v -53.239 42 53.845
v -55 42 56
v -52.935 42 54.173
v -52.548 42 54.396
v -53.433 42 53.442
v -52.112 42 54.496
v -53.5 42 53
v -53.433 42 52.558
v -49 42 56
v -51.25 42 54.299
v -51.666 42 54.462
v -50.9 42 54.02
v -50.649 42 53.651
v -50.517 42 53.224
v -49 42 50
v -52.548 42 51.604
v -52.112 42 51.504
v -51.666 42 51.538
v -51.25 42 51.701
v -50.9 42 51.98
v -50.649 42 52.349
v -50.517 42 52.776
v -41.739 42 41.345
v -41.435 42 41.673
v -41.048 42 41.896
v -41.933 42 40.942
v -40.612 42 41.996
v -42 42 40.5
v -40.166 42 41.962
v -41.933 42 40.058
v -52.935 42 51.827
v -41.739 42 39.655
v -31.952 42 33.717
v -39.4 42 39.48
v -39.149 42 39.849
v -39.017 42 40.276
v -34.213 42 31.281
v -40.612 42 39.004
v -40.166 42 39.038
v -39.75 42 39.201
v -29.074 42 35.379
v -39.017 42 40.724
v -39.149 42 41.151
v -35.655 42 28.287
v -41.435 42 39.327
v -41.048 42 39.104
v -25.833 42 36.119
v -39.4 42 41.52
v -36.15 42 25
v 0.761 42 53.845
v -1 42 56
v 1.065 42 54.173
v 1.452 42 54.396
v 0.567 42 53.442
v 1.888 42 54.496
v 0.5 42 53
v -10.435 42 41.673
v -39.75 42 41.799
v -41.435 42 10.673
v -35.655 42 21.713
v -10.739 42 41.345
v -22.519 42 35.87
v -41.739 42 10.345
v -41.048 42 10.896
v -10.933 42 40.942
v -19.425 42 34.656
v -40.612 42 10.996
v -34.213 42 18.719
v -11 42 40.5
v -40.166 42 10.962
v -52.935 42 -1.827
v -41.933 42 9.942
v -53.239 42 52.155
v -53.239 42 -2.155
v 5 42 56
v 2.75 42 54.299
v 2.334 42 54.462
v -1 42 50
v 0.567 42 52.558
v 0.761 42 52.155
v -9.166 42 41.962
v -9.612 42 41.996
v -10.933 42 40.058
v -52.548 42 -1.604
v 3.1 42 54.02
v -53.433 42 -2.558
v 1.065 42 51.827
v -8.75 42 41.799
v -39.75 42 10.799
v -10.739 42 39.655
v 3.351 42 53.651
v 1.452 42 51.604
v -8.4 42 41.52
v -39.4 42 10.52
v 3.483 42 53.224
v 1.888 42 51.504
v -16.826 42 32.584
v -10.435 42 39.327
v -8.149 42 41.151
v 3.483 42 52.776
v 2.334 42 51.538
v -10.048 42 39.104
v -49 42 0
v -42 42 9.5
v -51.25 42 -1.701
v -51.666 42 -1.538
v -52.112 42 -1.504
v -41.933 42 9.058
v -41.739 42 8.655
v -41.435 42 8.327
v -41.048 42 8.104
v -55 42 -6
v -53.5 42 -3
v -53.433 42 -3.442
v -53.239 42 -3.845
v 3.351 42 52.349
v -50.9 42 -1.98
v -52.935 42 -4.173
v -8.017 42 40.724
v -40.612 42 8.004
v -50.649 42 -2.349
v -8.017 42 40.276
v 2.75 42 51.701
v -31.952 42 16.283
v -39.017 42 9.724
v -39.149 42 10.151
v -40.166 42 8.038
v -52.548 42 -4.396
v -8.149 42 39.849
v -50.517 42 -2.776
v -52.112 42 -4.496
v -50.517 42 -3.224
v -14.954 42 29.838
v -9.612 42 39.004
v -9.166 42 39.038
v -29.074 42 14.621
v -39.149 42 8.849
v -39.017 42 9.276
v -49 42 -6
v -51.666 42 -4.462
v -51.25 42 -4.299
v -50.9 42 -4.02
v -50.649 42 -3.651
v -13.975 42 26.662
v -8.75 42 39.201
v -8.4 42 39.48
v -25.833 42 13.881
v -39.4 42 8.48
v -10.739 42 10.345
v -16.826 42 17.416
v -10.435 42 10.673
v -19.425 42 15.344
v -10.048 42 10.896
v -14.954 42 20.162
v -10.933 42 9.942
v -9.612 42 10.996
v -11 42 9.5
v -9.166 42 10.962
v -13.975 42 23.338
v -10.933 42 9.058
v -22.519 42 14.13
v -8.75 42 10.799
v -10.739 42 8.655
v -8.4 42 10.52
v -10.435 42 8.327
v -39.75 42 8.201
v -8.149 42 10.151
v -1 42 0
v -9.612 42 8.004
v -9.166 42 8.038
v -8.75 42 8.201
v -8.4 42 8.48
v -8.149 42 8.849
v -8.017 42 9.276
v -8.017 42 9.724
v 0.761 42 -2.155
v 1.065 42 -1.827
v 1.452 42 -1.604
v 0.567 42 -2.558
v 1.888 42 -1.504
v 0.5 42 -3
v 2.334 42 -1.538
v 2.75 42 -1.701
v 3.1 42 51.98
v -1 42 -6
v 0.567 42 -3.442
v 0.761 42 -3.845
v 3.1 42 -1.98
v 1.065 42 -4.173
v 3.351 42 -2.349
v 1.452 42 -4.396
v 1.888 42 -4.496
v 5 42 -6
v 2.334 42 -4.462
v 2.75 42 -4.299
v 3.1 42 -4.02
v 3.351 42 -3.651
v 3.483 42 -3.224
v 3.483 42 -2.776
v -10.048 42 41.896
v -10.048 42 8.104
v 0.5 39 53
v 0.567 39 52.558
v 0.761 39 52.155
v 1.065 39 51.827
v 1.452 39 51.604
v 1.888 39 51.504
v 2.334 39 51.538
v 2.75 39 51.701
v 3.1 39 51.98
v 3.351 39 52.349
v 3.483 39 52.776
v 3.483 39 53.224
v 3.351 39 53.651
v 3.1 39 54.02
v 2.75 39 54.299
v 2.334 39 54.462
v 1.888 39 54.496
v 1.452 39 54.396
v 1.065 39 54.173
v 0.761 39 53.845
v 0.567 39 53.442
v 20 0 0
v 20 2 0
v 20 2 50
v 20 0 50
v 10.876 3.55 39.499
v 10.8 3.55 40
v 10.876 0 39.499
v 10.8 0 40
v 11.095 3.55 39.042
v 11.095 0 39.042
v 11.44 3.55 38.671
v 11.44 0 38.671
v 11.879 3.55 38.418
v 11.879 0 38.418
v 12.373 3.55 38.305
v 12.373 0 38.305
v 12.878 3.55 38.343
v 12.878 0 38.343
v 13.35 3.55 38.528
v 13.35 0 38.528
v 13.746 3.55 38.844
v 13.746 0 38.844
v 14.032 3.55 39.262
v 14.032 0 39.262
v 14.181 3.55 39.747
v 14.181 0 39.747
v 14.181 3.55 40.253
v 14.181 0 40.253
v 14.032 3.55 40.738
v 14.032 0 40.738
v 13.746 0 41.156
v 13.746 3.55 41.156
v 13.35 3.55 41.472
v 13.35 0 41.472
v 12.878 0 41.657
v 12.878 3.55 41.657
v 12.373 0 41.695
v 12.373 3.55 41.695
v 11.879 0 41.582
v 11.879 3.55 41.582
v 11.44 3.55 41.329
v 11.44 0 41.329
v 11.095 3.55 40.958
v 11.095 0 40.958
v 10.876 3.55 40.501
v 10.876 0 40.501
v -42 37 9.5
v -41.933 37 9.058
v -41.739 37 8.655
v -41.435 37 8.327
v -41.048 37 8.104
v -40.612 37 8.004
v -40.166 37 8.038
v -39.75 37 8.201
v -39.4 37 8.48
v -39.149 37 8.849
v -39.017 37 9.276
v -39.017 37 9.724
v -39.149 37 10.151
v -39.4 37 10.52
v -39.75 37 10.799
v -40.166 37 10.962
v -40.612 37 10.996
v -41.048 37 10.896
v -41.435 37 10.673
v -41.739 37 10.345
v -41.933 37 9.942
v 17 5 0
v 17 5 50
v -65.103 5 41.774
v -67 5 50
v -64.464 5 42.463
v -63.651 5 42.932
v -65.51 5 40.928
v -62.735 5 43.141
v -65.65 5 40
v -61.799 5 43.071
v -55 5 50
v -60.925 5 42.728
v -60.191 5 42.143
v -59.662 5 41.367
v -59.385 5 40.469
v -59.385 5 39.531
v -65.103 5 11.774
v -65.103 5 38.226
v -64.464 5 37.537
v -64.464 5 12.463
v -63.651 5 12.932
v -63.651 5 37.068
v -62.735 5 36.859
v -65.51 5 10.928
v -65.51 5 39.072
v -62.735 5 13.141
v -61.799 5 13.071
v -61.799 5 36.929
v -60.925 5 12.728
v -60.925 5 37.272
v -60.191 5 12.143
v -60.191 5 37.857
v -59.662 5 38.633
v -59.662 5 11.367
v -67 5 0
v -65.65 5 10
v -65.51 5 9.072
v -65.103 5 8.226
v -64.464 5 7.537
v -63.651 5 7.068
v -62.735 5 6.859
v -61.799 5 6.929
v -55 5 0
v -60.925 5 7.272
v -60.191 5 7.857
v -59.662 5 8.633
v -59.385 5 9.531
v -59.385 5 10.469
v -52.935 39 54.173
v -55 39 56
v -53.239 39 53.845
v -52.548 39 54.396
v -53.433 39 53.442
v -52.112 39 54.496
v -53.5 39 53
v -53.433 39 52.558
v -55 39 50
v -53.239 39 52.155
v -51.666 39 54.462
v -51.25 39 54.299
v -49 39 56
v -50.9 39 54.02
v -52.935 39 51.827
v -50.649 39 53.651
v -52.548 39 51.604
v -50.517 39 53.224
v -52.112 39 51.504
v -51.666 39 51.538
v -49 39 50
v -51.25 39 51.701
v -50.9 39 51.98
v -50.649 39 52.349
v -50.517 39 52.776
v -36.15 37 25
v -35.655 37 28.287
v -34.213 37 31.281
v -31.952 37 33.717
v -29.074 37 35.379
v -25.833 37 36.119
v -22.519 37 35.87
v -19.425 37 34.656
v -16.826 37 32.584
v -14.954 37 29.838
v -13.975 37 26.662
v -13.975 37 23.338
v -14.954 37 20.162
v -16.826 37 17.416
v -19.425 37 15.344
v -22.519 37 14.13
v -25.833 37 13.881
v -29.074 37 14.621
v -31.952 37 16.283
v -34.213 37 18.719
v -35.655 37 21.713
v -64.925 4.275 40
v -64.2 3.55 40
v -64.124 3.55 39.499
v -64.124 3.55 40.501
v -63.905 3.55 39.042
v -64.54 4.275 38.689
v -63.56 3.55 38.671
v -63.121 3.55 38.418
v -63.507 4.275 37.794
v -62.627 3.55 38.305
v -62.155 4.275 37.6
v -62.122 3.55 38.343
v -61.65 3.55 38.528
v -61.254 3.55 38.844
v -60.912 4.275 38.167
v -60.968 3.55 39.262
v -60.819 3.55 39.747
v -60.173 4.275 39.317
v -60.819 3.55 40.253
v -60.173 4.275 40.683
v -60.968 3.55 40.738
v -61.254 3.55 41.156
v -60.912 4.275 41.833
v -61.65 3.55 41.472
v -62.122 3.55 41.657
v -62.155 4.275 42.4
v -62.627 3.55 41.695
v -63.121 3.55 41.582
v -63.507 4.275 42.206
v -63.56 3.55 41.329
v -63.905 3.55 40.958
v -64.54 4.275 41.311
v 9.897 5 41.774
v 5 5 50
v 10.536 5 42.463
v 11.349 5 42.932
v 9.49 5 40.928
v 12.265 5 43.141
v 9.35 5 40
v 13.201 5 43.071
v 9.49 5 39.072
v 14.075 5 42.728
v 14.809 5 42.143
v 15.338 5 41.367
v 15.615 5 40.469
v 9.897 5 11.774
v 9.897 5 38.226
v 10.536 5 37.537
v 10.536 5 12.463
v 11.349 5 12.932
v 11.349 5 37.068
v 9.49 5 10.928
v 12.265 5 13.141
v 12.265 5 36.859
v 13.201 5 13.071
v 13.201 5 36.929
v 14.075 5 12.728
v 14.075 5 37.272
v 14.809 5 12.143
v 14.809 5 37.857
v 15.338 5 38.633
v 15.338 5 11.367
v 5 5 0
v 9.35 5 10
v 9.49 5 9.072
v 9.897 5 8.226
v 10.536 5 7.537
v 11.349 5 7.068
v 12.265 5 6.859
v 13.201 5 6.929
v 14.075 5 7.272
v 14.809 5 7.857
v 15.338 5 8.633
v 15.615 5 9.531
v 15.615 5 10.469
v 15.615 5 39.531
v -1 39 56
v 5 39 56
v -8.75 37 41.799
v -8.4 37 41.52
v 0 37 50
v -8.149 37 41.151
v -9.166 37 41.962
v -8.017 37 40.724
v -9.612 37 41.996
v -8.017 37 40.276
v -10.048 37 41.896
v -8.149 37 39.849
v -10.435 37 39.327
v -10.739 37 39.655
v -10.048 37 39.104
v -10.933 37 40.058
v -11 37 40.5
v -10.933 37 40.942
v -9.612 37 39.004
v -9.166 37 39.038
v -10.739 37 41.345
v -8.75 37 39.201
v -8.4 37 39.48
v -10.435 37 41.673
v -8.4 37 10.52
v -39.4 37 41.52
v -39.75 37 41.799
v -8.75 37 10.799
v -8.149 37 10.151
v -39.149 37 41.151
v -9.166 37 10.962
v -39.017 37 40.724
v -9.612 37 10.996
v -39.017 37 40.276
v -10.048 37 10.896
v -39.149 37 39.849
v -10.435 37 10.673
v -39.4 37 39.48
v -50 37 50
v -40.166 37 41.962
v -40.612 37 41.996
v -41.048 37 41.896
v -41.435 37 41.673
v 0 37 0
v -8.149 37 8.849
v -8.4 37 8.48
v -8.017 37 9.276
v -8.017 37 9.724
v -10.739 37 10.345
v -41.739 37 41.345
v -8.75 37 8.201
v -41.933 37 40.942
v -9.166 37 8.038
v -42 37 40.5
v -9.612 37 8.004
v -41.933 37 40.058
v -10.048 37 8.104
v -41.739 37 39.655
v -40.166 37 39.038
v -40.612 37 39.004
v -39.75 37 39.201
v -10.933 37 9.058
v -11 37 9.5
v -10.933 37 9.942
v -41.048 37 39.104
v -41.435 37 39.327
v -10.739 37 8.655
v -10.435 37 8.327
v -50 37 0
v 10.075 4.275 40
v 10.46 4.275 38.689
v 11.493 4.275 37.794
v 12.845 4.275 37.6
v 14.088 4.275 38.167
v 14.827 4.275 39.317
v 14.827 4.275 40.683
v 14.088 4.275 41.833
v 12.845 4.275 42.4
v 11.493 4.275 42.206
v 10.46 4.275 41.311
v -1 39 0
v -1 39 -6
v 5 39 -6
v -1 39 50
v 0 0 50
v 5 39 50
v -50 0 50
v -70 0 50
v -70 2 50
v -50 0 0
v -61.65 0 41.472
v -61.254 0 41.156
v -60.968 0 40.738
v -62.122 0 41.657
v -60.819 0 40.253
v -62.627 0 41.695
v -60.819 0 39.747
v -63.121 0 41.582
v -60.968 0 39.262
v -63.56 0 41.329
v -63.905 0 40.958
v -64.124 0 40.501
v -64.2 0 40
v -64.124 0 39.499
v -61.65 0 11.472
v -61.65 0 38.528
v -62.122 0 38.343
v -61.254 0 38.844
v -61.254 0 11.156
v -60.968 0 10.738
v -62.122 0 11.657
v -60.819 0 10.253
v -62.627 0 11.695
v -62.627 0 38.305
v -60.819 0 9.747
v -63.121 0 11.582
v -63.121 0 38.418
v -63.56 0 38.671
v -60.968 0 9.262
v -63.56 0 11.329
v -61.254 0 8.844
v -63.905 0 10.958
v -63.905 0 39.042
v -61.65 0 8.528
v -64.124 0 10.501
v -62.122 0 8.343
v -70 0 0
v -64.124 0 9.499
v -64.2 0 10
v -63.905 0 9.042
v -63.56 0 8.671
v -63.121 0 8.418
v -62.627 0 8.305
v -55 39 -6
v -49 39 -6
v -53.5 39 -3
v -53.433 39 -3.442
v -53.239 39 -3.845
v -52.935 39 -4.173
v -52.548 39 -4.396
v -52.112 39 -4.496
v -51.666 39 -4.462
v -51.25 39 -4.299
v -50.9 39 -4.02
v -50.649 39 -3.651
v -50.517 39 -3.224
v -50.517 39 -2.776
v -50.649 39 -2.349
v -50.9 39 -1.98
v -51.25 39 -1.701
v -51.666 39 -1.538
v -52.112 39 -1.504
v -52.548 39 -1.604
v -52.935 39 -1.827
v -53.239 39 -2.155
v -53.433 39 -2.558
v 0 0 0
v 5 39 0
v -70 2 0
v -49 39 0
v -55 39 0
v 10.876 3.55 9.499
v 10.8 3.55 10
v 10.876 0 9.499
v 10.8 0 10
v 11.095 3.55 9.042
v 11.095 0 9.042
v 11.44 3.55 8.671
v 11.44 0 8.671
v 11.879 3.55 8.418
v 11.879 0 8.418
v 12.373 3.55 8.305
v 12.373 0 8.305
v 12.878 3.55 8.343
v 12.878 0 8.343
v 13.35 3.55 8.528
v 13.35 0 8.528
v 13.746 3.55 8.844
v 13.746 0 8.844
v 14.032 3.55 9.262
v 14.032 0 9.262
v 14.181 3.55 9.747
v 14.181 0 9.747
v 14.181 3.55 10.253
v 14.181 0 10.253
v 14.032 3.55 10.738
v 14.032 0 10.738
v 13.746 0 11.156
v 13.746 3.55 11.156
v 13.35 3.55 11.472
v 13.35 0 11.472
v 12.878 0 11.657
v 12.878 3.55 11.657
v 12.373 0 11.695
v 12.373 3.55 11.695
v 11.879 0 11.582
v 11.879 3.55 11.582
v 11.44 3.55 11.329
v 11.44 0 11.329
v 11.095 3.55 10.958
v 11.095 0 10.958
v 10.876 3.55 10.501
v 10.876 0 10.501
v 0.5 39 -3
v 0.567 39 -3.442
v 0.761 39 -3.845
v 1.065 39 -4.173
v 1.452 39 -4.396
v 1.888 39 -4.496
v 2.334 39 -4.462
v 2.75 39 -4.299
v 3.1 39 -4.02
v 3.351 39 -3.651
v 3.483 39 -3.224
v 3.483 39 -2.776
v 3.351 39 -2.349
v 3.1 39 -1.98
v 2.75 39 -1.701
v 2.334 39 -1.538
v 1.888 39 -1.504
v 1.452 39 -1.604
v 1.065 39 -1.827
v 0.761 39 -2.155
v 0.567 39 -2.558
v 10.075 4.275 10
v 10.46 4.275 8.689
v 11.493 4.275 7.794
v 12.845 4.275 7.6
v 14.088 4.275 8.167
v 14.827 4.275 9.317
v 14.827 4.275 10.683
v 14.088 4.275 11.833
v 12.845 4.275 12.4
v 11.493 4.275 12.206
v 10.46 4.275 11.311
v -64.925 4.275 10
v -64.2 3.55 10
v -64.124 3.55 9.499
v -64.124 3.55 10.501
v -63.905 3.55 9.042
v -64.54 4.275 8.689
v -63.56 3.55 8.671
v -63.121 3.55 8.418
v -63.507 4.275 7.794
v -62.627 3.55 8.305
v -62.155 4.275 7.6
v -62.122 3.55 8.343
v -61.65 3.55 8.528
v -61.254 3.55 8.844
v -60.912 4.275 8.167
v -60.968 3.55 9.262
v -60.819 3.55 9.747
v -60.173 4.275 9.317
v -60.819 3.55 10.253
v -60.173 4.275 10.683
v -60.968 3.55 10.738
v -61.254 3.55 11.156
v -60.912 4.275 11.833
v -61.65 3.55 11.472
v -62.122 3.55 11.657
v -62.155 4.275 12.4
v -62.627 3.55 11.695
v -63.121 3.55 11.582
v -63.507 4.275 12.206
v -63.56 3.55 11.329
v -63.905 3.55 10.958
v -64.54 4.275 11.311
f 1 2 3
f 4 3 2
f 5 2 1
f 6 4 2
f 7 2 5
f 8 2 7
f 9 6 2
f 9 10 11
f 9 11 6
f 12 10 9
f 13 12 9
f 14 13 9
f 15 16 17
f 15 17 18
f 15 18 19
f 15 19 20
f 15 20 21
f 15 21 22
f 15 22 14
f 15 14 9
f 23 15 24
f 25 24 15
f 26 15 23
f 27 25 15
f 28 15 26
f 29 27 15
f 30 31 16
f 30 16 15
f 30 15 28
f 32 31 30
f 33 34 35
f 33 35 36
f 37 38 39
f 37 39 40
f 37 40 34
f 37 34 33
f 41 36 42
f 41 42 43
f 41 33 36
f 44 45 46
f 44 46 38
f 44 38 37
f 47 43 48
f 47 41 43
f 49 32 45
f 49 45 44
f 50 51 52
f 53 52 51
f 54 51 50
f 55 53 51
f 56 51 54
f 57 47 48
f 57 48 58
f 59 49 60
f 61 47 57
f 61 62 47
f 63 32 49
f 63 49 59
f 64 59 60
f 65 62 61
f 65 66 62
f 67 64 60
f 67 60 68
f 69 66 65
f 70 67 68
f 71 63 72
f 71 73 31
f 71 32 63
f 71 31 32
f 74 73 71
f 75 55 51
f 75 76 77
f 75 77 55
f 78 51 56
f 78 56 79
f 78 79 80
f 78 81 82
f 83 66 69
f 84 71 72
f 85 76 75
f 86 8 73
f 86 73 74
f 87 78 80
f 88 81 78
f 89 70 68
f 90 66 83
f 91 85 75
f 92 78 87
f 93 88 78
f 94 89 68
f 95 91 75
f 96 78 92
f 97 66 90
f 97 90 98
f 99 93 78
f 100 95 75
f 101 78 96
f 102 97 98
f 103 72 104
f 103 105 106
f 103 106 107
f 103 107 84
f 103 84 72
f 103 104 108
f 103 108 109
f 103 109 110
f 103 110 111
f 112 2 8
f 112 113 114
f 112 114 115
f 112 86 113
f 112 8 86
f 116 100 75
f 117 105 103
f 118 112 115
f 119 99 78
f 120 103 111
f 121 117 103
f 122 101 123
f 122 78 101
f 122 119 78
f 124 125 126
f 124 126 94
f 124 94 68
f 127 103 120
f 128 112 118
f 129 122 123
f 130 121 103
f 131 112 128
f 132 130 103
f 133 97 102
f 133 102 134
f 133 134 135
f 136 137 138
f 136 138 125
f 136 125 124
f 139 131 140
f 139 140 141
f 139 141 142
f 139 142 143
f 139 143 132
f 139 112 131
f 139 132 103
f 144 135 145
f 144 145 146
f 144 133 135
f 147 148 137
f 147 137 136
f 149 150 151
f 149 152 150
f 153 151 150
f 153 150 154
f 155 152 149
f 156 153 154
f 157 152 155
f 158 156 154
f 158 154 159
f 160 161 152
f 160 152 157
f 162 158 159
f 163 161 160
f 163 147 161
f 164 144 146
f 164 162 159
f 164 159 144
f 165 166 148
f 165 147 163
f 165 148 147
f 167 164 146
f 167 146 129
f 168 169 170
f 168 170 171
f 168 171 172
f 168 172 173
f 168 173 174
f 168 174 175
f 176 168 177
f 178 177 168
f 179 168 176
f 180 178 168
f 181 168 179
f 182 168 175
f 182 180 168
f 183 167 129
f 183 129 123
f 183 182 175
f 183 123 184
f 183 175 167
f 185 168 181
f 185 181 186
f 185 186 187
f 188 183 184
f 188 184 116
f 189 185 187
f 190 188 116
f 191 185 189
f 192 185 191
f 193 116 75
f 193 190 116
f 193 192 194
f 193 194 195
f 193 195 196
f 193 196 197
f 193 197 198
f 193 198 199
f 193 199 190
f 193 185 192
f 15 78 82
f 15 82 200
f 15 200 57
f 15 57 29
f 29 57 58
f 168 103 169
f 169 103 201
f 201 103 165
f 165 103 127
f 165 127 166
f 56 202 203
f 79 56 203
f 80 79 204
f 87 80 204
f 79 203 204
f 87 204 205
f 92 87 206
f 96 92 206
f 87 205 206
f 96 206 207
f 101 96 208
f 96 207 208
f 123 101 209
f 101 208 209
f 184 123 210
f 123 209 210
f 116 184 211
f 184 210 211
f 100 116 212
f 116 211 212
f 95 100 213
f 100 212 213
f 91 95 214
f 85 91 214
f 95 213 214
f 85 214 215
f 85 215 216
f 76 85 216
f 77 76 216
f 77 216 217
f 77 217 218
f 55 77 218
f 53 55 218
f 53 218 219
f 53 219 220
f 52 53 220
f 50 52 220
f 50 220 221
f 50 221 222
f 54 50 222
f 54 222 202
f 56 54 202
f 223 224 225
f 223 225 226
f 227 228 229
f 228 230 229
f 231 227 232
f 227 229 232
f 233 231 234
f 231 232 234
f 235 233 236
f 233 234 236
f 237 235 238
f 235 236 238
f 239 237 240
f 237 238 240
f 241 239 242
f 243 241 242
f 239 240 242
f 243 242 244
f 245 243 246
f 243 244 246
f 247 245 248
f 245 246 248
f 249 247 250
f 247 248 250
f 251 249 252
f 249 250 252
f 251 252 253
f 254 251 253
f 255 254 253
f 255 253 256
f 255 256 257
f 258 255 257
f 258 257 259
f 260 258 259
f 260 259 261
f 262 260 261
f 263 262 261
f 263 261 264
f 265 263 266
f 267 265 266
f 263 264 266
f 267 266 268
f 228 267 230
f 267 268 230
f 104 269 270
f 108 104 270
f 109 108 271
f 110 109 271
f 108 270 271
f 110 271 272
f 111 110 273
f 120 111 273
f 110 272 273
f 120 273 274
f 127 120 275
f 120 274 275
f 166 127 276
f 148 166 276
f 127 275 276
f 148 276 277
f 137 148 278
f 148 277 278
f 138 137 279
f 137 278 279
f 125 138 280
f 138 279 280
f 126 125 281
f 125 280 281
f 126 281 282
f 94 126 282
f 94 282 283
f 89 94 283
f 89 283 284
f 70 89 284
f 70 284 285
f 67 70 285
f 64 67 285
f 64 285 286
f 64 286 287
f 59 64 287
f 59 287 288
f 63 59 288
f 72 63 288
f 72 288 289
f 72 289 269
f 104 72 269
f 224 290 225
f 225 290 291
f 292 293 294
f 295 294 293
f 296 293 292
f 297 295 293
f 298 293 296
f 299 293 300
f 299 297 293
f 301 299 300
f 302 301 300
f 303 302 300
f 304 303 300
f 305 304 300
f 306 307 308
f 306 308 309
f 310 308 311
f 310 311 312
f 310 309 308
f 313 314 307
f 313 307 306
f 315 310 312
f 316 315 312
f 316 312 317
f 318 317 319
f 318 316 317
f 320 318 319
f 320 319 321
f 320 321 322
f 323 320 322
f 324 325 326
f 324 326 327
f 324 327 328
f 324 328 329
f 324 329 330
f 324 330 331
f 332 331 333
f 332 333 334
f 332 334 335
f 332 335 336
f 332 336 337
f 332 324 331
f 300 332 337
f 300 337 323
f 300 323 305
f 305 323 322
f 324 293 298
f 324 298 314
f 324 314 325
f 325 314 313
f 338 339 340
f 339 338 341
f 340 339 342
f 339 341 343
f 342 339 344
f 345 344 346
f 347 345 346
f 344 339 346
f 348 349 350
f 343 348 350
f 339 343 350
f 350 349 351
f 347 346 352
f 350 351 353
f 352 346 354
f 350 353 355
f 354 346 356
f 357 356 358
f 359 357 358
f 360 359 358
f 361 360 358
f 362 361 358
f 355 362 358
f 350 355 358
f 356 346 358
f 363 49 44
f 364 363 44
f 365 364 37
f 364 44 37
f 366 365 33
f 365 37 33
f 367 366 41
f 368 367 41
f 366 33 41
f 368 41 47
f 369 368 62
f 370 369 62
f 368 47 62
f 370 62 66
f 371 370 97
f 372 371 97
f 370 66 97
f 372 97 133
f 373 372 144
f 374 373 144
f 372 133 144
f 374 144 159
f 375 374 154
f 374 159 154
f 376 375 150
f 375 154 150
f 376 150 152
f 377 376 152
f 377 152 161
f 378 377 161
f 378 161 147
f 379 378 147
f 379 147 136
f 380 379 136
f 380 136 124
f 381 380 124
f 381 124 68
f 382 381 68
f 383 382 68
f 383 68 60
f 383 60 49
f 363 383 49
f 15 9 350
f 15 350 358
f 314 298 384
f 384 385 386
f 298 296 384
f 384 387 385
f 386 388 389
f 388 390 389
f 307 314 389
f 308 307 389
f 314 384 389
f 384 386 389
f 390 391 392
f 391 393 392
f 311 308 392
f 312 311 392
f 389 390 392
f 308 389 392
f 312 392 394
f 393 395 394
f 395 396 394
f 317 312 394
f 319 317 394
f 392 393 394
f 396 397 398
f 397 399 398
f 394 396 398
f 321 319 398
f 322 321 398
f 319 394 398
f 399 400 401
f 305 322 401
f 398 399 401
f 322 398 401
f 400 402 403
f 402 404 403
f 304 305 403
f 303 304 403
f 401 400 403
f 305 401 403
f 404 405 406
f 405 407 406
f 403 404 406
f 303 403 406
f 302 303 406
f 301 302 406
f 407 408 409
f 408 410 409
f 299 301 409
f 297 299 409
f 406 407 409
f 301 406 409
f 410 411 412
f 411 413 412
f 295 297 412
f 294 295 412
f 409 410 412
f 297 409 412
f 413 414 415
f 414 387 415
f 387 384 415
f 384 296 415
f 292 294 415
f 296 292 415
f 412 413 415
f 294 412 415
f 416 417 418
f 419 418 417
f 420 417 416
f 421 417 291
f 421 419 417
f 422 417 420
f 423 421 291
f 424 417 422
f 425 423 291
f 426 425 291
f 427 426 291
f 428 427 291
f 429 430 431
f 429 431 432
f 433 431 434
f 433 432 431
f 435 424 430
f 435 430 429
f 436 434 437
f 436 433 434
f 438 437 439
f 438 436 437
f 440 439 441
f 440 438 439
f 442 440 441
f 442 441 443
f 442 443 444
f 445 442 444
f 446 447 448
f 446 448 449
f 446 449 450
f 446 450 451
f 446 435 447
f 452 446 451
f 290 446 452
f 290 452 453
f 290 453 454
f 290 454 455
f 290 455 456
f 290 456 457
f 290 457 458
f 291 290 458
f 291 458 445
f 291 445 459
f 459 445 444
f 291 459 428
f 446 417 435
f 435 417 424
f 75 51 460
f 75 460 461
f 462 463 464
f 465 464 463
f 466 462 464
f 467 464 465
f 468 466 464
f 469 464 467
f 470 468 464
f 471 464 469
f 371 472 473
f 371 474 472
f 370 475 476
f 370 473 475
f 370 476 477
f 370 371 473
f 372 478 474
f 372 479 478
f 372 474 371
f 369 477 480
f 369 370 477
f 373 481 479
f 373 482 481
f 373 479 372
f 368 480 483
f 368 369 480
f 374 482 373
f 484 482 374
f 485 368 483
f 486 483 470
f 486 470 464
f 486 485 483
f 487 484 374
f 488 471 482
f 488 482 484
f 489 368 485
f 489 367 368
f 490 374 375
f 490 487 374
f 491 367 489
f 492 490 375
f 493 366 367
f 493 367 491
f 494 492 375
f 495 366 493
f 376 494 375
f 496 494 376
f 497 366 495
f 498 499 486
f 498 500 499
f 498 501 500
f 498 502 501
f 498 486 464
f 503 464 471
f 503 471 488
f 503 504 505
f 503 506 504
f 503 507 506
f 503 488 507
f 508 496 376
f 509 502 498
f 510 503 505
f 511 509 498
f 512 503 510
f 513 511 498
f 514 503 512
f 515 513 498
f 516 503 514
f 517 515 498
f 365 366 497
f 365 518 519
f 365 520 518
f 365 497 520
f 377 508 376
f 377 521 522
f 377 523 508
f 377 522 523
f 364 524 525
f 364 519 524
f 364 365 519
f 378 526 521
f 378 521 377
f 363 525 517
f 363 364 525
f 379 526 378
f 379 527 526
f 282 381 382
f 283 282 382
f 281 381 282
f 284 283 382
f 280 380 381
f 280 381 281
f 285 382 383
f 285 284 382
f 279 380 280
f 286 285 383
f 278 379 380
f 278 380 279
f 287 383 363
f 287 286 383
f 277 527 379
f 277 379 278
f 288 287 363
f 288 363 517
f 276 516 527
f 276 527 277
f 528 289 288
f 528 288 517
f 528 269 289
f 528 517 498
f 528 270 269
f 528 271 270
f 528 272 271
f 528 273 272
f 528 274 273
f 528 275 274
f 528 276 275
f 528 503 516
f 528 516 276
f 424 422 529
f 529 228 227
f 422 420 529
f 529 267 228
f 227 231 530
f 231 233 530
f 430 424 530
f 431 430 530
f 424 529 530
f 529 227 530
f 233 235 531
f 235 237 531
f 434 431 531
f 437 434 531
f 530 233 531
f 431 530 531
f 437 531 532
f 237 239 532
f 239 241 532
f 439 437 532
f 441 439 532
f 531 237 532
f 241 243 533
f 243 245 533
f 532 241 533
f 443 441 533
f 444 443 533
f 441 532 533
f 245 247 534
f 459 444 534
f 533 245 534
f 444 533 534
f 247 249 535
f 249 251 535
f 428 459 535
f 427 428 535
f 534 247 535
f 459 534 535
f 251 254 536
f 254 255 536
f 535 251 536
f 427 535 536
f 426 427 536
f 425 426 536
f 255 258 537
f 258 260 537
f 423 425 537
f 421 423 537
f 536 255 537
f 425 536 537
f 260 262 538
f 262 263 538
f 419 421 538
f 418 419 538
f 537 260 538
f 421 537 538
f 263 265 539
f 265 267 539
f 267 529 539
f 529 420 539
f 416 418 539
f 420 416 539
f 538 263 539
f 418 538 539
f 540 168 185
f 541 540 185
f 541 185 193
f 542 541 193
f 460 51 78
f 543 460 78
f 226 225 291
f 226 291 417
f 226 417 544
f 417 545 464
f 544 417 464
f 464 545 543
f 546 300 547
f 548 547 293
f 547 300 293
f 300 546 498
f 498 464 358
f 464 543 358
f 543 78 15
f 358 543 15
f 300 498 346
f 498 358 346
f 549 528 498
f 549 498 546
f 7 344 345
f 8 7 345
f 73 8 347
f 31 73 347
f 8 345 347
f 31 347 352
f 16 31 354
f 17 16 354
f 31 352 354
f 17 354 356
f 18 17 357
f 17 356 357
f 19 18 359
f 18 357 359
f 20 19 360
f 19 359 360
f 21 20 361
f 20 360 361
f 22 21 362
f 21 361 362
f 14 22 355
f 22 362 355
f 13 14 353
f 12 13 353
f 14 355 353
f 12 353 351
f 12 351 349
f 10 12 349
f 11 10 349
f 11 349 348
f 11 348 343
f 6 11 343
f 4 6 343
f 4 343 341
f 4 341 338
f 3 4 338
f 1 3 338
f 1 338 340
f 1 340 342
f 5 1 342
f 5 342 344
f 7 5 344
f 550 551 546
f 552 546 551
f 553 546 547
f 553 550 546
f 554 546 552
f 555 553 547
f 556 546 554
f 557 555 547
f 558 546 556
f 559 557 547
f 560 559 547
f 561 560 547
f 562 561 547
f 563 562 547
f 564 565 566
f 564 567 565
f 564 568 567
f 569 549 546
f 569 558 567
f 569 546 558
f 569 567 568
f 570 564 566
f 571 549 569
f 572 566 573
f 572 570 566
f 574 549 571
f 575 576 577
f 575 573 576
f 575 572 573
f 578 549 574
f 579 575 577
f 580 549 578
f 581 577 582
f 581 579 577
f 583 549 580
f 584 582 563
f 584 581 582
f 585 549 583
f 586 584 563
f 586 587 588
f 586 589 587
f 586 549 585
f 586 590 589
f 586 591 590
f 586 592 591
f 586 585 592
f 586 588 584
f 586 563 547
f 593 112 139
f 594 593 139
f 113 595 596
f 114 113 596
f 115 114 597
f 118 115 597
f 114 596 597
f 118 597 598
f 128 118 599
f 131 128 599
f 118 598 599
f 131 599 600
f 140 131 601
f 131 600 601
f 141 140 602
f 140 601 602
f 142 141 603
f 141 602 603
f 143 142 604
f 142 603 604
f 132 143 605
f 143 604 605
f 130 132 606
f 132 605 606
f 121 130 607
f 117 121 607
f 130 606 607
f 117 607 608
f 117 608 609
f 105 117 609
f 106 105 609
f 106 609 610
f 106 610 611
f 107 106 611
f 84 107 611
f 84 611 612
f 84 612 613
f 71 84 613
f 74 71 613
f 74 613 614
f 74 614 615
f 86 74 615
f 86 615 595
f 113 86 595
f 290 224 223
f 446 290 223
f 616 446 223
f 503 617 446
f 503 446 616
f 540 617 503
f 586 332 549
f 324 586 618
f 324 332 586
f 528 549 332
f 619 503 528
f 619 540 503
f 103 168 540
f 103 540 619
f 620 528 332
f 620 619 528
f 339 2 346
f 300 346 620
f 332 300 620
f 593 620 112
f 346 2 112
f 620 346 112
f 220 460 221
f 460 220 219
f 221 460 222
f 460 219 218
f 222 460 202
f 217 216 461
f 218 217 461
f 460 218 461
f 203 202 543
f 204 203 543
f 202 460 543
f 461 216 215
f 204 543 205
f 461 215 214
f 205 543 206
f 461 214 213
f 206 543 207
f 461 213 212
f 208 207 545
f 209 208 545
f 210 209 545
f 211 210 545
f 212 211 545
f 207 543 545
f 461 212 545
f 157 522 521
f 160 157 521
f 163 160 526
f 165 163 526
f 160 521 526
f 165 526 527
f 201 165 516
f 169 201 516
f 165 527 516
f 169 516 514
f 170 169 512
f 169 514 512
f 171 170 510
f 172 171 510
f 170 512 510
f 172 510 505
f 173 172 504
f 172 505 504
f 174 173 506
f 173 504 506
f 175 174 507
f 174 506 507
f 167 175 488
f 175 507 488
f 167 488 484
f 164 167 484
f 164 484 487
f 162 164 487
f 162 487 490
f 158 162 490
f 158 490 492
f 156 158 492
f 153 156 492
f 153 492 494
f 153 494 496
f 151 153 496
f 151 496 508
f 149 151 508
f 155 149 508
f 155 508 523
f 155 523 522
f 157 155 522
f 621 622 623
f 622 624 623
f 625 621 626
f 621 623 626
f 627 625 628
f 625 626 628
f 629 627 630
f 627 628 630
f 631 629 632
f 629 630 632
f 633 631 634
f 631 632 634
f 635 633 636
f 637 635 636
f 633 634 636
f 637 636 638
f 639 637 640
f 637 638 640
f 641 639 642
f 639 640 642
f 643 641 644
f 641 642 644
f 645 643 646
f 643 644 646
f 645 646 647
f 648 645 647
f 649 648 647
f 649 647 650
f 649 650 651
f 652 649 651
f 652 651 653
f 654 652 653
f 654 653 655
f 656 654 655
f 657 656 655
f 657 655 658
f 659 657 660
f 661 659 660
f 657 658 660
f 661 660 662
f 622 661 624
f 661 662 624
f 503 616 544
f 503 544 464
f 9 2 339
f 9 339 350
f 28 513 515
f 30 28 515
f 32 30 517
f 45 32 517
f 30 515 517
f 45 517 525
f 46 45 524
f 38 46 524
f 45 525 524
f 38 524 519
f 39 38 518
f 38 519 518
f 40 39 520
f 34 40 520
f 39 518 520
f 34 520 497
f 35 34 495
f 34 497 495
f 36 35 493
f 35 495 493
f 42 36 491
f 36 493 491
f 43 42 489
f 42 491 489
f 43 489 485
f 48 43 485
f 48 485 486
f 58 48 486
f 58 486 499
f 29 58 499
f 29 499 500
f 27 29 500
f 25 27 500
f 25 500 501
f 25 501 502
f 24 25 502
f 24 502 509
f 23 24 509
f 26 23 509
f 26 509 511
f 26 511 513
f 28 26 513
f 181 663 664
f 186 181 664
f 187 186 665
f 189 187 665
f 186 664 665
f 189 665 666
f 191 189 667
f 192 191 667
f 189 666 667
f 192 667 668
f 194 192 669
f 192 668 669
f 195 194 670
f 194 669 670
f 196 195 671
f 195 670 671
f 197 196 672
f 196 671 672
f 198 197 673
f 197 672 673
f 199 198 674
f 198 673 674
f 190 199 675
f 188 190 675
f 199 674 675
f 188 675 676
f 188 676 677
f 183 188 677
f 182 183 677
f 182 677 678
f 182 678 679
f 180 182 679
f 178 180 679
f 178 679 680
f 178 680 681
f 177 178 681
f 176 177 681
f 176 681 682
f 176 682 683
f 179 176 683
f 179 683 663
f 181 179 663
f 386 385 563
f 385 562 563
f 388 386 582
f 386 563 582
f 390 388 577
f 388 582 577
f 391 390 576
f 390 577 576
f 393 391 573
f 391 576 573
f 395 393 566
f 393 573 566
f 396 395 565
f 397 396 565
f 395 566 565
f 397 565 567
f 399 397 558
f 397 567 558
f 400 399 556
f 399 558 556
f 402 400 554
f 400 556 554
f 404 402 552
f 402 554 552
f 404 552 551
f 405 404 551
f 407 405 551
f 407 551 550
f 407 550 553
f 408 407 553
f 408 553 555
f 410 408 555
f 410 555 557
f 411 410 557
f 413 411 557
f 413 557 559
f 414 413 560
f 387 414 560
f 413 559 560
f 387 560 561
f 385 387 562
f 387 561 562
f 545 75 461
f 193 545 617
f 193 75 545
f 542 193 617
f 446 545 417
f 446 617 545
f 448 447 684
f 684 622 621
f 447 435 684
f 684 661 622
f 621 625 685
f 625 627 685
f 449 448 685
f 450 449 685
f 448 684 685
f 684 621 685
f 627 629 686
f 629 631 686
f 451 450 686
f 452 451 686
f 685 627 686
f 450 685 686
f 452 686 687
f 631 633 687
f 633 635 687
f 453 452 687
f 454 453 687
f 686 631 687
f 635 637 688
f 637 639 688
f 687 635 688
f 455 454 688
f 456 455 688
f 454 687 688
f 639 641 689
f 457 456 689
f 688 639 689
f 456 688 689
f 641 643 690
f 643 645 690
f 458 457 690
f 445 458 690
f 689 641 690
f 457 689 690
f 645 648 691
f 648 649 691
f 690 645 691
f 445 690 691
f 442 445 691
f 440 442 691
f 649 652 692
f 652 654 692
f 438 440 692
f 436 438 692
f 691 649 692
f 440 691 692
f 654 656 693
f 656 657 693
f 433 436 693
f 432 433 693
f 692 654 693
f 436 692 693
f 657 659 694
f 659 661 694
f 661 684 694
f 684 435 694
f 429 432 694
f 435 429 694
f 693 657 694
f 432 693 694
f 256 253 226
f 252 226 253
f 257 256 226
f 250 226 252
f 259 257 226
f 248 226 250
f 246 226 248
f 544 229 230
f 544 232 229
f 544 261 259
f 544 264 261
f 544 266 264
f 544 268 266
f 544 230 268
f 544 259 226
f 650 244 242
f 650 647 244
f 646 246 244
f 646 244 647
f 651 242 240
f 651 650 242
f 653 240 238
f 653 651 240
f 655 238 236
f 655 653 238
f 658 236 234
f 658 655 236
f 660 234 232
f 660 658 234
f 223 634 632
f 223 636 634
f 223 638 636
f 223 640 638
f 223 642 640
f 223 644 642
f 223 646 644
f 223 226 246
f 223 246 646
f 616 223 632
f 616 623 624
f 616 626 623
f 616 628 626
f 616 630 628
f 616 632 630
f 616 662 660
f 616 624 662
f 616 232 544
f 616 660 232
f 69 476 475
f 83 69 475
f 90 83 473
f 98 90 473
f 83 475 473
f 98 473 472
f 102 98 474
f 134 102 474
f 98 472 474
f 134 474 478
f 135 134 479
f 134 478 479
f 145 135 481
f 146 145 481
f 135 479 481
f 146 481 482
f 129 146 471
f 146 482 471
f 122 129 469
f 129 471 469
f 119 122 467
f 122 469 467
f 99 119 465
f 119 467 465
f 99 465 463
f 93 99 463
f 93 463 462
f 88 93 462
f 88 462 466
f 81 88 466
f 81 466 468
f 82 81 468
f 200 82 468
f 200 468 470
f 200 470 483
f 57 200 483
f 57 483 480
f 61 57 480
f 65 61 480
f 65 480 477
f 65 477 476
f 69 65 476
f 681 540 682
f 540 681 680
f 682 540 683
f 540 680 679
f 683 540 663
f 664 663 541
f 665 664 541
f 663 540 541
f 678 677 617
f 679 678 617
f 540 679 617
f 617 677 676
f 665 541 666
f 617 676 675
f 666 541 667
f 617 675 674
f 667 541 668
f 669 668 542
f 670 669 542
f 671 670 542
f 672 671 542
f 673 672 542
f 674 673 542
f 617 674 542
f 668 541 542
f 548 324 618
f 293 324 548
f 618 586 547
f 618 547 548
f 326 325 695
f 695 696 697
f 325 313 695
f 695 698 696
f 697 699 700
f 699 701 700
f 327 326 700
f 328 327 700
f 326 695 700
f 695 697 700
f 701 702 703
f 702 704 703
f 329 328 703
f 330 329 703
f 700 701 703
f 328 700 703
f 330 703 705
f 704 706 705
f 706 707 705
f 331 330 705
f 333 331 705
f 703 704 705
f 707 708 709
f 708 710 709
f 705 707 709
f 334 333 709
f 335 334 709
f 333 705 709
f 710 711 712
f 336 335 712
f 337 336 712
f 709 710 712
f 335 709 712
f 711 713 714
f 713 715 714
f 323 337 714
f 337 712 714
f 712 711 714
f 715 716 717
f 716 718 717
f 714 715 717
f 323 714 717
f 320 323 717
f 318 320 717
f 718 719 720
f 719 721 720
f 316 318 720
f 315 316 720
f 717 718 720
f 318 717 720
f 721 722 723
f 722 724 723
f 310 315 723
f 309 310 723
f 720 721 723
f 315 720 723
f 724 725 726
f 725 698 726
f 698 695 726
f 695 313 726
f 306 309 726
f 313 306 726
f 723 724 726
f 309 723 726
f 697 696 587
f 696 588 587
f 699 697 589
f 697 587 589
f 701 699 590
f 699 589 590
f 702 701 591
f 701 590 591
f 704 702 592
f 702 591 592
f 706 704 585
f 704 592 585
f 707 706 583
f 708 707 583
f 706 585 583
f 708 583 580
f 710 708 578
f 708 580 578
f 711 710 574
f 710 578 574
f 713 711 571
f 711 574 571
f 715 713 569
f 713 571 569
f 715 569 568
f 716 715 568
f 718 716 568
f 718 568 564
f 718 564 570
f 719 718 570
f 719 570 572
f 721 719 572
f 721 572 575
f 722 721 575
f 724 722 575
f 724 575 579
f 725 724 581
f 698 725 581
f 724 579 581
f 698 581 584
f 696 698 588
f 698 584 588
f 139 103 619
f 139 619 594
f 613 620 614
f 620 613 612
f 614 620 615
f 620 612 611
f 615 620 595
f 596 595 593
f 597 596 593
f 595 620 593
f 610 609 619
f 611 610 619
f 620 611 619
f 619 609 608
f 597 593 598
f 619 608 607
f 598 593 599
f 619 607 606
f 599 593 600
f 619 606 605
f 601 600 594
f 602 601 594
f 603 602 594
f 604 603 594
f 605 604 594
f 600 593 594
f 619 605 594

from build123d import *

# Parameters (mm, degrees)
BOSS_EXTRUDE1_DEPTH                             = 50
CSK_FOR_M3_FLAT_HEAD_MACHINE_SCREW1_D           = 3.4
CSK_FOR_M3_FLAT_HEAD_MACHINE_SCREW1_CSINK_D     = 6.3
CSK_FOR_M3_FLAT_HEAD_MACHINE_SCREW1_CSINK_ANGLE = 90
SKETCH8_R                                       = 11.15
CUT_EXTRUDE1_DEPTH                              = 41
F_3_0_3_DIAMETER_HOLE1_D                        = 3
CHAMFER1_SIZE                                   = 3
SKETCH14_W                                      = 6
SKETCH14_H                                      = 6
BOSS_EXTRUDE2_DEPTH                             = 3
F_3_0_3_DIAMETER_HOLE2_D                        = 3


with BuildPart() as part:
    # Sketch2 → Boss-Extrude1 (new body)
    with BuildSketch(Plane.XY):
        Polygon((0, 0), (0, 37), (-50, 37), (-50, 0), (-70, 0), (-70, 5), (-55, 5), (-55, 42), (-50, 42), (5, 42), (5, 5), (20, 5), (20, 0), align=None)
    extrude(amount=BOSS_EXTRUDE1_DEPTH)

    # CSK for M3 Flat Head Machine Screw1 (through all)
    with Locations(Plane(origin=(0, 5, 0), x_dir=(1, 0, 0), z_dir=(0, 1, 0))):
        with Locations((-62.5, -10), (-62.5, -40), (12.5, -40), (12.5, -10)):
            CounterSinkHole(CSK_FOR_M3_FLAT_HEAD_MACHINE_SCREW1_D / 2, CSK_FOR_M3_FLAT_HEAD_MACHINE_SCREW1_CSINK_D / 2, counter_sink_angle=CSK_FOR_M3_FLAT_HEAD_MACHINE_SCREW1_CSINK_ANGLE)

    # Sketch8 → Cut-Extrude1 (cut)
    with BuildSketch(Plane(origin=(0, 42, 0), x_dir=(1, 0, 0), z_dir=(0, 1, 0))):
        with Locations(Location((-25, -25, 0), (0, 0, 180))):
            Circle(SKETCH8_R)
    extrude(amount=-CUT_EXTRUDE1_DEPTH, mode=Mode.SUBTRACT)

    # Ø3.0 (3) Diameter Hole1 (through all)
    with Locations(Plane(origin=(0, 42, 0), x_dir=(1, 0, 0), z_dir=(0, 1, 0))):
        with Locations((-40.5, -40.5), (-40.5, -9.5), (-9.5, -9.5), (-9.5, -40.5)):
            Hole(F_3_0_3_DIAMETER_HOLE1_D / 2)

    # Chamfer1
    chamfer1_edges = [part.edges().sort_by_distance(p)[0] for p in [
        (-70, 5, 25),
        (20, 5, 25),
    ]]
    chamfer(chamfer1_edges, length=CHAMFER1_SIZE)

    # Sketch14 → Boss-Extrude2 (add)
    with BuildSketch(Plane(origin=(0, 42, 0), x_dir=(1, 0, 0), z_dir=(0, 1, 0))):
        with Locations((-52, 3)):
            Rectangle(SKETCH14_W, SKETCH14_H)
        with Locations((-52, -53)):
            Rectangle(SKETCH14_W, SKETCH14_H)
        with Locations((2, 3)):
            Rectangle(SKETCH14_W, SKETCH14_H)
        with Locations((2, -53)):
            Rectangle(SKETCH14_W, SKETCH14_H)
    extrude(amount=-BOSS_EXTRUDE2_DEPTH)

    # Ø3.0 (3) Diameter Hole2 (through all)
    with Locations(Plane(origin=(0, 42, 0), x_dir=(1, 0, 0), z_dir=(0, 1, 0))):
        with Locations((-52, 3), (2, 3), (2, -53), (-52, -53)):
            Hole(F_3_0_3_DIAMETER_HOLE2_D / 2)


solid = part.part
